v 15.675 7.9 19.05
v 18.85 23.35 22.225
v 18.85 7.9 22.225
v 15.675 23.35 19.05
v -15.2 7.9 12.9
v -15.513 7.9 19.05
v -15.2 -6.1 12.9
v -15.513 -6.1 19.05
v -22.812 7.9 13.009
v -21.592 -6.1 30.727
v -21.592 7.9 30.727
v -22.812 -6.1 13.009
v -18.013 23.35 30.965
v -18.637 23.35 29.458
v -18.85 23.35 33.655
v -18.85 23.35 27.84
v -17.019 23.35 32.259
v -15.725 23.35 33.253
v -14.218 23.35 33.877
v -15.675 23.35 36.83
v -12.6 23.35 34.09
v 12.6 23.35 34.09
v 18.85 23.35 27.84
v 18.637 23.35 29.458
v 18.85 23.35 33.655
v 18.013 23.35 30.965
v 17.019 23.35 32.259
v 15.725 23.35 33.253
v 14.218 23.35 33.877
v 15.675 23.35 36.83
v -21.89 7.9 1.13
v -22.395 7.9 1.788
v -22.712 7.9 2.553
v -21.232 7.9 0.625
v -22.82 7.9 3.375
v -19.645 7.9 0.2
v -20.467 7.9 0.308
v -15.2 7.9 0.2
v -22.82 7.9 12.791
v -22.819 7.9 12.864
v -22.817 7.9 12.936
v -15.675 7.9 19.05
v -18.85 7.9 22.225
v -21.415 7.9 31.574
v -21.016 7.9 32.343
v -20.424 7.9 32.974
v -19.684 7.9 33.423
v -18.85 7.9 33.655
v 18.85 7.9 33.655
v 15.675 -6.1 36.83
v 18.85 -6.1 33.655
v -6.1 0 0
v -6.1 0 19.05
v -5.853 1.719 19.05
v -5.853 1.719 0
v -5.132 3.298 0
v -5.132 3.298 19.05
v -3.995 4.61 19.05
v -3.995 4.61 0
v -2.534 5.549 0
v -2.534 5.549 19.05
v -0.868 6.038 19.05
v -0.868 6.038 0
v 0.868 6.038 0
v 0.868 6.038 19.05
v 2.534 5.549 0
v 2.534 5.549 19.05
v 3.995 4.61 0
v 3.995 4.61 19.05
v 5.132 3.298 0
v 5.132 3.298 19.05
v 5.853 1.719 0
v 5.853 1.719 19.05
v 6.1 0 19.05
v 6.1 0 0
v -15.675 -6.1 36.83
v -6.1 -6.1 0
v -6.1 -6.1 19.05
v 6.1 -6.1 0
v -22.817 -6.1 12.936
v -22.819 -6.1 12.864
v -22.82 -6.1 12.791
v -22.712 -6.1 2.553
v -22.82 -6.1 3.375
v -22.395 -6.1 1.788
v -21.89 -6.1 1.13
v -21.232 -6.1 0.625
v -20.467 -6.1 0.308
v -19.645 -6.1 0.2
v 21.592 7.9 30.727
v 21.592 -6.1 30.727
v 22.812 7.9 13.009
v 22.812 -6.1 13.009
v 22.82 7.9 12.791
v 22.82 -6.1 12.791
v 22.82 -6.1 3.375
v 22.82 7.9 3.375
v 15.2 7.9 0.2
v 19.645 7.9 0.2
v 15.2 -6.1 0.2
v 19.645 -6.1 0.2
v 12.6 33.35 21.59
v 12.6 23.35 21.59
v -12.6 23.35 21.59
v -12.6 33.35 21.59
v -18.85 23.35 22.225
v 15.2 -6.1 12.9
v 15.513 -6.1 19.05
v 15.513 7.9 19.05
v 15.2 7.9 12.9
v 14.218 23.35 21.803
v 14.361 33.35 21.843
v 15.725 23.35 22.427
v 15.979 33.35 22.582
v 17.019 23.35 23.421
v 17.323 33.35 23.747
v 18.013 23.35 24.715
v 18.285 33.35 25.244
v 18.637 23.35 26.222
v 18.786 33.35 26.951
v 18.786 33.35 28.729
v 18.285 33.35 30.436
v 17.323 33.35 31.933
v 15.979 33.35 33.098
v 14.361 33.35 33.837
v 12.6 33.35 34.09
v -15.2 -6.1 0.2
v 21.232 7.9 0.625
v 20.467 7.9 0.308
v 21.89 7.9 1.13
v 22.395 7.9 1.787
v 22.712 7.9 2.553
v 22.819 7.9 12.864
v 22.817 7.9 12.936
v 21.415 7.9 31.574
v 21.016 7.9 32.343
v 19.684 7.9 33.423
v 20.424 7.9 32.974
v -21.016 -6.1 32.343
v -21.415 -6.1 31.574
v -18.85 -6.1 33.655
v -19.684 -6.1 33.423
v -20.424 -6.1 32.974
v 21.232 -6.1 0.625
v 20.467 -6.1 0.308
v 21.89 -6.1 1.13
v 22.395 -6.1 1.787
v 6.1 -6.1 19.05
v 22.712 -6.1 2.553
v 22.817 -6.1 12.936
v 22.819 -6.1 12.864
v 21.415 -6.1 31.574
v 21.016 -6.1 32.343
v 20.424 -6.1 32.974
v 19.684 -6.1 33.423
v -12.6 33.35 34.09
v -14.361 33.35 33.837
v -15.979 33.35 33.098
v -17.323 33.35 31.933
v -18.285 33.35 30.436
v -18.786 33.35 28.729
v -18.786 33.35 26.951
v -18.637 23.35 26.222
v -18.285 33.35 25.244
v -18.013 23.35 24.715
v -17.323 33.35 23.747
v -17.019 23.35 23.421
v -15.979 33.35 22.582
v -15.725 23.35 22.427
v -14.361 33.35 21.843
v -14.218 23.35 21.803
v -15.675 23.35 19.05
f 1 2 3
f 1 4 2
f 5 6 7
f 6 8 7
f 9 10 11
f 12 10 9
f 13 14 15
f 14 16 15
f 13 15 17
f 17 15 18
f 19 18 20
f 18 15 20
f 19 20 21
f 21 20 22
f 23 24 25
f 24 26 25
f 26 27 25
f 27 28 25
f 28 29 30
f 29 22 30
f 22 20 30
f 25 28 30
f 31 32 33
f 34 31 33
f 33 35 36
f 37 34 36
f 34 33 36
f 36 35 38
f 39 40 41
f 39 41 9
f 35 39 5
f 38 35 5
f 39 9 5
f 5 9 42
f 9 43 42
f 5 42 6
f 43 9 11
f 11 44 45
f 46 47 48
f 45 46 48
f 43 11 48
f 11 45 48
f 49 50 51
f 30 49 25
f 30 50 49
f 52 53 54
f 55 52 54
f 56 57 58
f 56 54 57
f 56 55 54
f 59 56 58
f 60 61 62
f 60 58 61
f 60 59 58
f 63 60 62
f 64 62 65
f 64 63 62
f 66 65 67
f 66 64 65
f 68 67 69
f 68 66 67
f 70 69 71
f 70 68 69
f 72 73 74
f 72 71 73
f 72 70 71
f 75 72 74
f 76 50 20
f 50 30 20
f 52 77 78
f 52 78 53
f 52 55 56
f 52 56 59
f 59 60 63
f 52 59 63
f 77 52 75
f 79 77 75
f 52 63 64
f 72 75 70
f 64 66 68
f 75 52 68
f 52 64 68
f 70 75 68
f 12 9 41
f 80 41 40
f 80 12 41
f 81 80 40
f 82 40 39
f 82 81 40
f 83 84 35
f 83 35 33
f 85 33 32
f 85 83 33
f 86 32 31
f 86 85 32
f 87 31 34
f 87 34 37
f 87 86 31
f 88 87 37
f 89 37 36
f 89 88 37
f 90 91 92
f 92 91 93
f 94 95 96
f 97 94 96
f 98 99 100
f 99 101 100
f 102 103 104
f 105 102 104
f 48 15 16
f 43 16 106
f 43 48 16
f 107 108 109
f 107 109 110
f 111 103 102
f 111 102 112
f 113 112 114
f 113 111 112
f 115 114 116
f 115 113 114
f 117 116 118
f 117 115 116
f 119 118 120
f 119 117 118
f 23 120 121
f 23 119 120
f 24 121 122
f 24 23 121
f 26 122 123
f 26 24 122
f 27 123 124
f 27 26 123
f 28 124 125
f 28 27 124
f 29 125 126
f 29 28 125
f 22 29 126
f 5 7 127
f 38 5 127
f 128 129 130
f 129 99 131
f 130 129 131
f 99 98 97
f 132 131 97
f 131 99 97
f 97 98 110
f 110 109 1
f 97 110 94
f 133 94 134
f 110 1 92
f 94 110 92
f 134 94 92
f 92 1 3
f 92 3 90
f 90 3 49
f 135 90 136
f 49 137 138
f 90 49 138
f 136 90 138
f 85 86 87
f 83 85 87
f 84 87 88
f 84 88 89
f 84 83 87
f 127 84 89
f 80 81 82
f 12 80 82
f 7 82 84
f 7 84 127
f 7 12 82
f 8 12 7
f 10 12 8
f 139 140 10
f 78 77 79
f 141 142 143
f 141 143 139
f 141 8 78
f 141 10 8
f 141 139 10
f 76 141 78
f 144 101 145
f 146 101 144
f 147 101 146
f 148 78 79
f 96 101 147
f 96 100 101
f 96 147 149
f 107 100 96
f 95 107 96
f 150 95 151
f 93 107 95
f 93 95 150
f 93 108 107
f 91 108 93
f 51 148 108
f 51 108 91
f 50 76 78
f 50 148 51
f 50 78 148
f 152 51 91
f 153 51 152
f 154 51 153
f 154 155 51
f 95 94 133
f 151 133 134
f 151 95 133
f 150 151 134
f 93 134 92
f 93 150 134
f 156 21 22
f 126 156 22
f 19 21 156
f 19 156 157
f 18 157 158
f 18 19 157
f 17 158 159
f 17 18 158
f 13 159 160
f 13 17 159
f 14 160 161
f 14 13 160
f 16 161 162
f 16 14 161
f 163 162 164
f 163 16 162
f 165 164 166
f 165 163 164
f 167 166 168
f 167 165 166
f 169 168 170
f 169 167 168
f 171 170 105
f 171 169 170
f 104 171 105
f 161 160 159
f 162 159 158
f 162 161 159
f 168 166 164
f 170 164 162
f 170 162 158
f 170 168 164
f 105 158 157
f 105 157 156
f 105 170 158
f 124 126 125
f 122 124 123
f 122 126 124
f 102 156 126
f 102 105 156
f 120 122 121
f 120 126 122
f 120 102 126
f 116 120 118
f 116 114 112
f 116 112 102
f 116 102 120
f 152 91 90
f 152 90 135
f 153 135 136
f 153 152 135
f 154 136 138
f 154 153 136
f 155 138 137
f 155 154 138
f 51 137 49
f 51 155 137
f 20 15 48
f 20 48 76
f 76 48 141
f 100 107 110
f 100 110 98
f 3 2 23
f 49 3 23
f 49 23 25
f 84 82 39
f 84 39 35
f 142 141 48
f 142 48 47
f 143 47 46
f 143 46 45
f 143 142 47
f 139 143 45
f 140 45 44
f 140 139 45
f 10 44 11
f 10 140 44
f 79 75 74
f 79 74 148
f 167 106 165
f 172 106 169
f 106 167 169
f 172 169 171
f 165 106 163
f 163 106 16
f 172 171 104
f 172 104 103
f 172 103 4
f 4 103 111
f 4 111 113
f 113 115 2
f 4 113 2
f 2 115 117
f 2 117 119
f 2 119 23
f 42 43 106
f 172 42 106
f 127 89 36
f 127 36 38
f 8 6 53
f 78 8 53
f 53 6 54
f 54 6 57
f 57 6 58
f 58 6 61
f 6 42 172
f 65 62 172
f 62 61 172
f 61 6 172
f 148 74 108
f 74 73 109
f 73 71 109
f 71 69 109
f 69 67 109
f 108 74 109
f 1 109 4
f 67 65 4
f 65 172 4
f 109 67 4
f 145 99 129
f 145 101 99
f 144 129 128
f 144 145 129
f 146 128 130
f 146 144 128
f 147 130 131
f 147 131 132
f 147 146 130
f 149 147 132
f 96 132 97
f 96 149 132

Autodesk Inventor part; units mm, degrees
ref_plane "YZ Plane" through (0, 0, 0) normal (1, 0, 0) x (0, 1, 0)
ref_plane "XZ Plane" through (0, 0, 0) normal (0, 1, 0) x (-1, 0, 0)
ref_plane "XY Plane" through (0, 0, 0) normal (0, 0, 1) x (1, 0, 0)
sketch "Sketch1" plane through (0, 0, 0) normal (0, 0, 1) x (1, 0, 0)
  circle A0 centre (0, 0) radius 6.1
  line L0 (-6.1, 0) -> (-6.1, -6.1)
  line L1 (-6.1, -6.1) -> (6.1, -6.1)
  line L2 (6.1, -6.1) -> (6.1, 0)
  dimension "d0" = 12.2
extrude "Extrusion1" add sketch "Sketch1" along normal blind 19.05
sketch "Sketch2" plane through (0, 0, 19.05) normal (0, 0, 1) x (1, 0, 0)
  arc A0 (6.1, 0) -> (-6.1, 0) centre (0, 0) ccw construction
  line L0 (-6.1, 0) -> (-6.1, -6.1) construction
  line L1 (6.1, -6.1) -> (6.1, 0) construction
  line L2 (-6.1, -6.1) -> (-6.1, 6.1)
  line L3 (-6.1, 6.1) -> (6.1, 6.1)
  line L4 (6.1, 6.1) -> (6.1, -6.1)
  line L5 (-6.1, -6.1) -> (6.1, -6.1)
extrude "Extrusion2" add sketch "Sketch2" along normal blind 17.78
sketch "Sketch3" plane through (0, 6.1, 19.05) normal (0, 1, 0) x (1, 0, 0)
  line L0 (0, 0) -> (-6.1, 0) construction
  line L1 (-12.6, -8.79) -> (12.6, -8.79) construction
  line L2 (-12.6, -15.04) -> (12.6, -15.04)
  line L3 (12.6, -2.54) -> (-12.6, -2.54)
  arc A0 (-12.6, -2.54) -> (-12.6, -15.04) centre (-12.6, -8.79) ccw
  arc A1 (12.6, -15.04) -> (12.6, -2.54) centre (12.6, -8.79) ccw
  point P0 (0, 19.05)
  point P1 (0, -8.79)
  point P2 (0, -2.54)
  dimension "d5" = 2.54
  dimension "d6" = 25.2
  dimension "d7" = 12.5
extrude "Extrusion3" add sketch "Sketch3" along normal blind 27.25
sketch "Sketch4" plane through (0, 6.1, 19.05) normal (0, -1, 0) x (1, 0, 0)
  arc A0 (12.6, 2.54) -> (12.6, 15.04) centre (12.6, 8.79) ccw construction
  line L0 (-18.85, 0) -> (18.85, 0)
  line L1 (18.85, 0) -> (18.85, 17.78)
  line L2 (18.85, 17.78) -> (-18.85, 17.78)
  line L3 (-18.85, 17.78) -> (-18.85, 0)
  arc A1 (-12.6, 15.04) -> (-12.6, 2.54) centre (-12.6, 8.79) ccw construction
  line L4 (-6.1, 17.78) -> (6.1, 17.78) construction
  point P0 (0, -19.05)
  point P1 (-18.85, 8.79)
  point P2 (18.85, 8.79)
  point P3 (0, 17.78)
  point P4 (0, 0)
extrude "Extrusion4" add sketch "Sketch4" against normal blind 17.25
sketch "Sketch5" plane through (0, 6.1, 19.05) normal (0, -1, 0) x (1, 0, 0)
  line L0 (-18.85, 0) -> (-6.1, 0) construction
  line L1 (18.85, 17.78) -> (-18.85, 17.78)
  line L2 (-18.85, 17.78) -> (-18.85, 0)
  line L3 (-18.85, 0) -> (18.85, 0)
  line L4 (18.85, 0) -> (18.85, 17.78)
  point P0 (0, -19.05)
extrude "Extrusion5" add sketch "Sketch5" along normal up to surface (12.2 mm away)
chamfer "Chamfer1" distance 3.175 angle 45 4 edges at (18.85, 8.625, 19.05) (18.85, 8.625, 36.83) (-18.85, 8.625, 19.05) (-18.85, 8.625, 36.83)
sketch "Sketch6" plane through (-6.1, -6.1, 0) normal (0, -1, 0) x (1, 0, 0)
  line L0 (0, 0) -> (12.2, 0) construction
  line L1 (24.95, 33.655) -> (24.95, 22.225) construction
  line L2 (-9.575, 36.83) -> (21.775, 36.83) construction
  line L3 (21.3, 12.9) -> (21.3, 0.2)
  line L4 (24.95, 27.84) -> (24.95, 22.225) construction
  line L5 (24.95, 22.225) -> (21.775, 22.225)
  line L6 (21.775, 22.225) -> (21.3, 12.9)
  line L7 (24.95, 22.225) -> (24.95, 33.655)
  line L8 (24.95, 33.655) -> (27.49, 33.655)
  line L9 (27.49, 33.655) -> (28.92, 12.9)
  line L10 (28.92, 12.9) -> (28.92, 0.2)
  line L11 (28.92, 0.2) -> (21.3, 0.2)
  line L12 (6.1, 0) -> (6.1, 36.83)
  line L13 (-12.75, 22.225) -> (-9.575, 19.05) construction
  line L14 (-12.75, 33.655) -> (-12.75, 22.225) construction
  line L15 (-9.1, 12.9) -> (-9.1, 0.2)
  line L16 (-12.75, 27.84) -> (-12.75, 22.225) construction
  line L17 (-12.75, 22.225) -> (-9.575, 22.225)
  line L18 (-9.575, 22.225) -> (-9.1, 12.9)
  line L19 (-12.75, 22.225) -> (-12.75, 33.655)
  line L20 (-12.75, 33.655) -> (-15.29, 33.655)
  line L21 (-15.29, 33.655) -> (-16.72, 12.9)
  line L22 (-16.72, 12.9) -> (-16.72, 0.2)
  line L23 (-16.72, 0.2) -> (-9.1, 0.2)
  point P0 (6.1, 0)
  dimension "d17" = 15.2
  dimension "d19" = 0.2
  dimension "d21" = 7.62
  dimension "d23" = 12.7
  dimension "d28" = 2.54
  dimension "d29" = 3.175
extrude "Extrusion6" add sketch "Sketch6" against normal blind 14
fillet "Fillet1" radius 3.175 6 edges at (21.39, 0.9, 33.655) (-21.39, 0.9, 33.655) (-22.82, 0.9, 0.2) (-22.82, 0.9, 12.9) (22.82, 0.9, 0.2) (22.82, 0.9, 12.9)
properties part number "SecondarySecure"
